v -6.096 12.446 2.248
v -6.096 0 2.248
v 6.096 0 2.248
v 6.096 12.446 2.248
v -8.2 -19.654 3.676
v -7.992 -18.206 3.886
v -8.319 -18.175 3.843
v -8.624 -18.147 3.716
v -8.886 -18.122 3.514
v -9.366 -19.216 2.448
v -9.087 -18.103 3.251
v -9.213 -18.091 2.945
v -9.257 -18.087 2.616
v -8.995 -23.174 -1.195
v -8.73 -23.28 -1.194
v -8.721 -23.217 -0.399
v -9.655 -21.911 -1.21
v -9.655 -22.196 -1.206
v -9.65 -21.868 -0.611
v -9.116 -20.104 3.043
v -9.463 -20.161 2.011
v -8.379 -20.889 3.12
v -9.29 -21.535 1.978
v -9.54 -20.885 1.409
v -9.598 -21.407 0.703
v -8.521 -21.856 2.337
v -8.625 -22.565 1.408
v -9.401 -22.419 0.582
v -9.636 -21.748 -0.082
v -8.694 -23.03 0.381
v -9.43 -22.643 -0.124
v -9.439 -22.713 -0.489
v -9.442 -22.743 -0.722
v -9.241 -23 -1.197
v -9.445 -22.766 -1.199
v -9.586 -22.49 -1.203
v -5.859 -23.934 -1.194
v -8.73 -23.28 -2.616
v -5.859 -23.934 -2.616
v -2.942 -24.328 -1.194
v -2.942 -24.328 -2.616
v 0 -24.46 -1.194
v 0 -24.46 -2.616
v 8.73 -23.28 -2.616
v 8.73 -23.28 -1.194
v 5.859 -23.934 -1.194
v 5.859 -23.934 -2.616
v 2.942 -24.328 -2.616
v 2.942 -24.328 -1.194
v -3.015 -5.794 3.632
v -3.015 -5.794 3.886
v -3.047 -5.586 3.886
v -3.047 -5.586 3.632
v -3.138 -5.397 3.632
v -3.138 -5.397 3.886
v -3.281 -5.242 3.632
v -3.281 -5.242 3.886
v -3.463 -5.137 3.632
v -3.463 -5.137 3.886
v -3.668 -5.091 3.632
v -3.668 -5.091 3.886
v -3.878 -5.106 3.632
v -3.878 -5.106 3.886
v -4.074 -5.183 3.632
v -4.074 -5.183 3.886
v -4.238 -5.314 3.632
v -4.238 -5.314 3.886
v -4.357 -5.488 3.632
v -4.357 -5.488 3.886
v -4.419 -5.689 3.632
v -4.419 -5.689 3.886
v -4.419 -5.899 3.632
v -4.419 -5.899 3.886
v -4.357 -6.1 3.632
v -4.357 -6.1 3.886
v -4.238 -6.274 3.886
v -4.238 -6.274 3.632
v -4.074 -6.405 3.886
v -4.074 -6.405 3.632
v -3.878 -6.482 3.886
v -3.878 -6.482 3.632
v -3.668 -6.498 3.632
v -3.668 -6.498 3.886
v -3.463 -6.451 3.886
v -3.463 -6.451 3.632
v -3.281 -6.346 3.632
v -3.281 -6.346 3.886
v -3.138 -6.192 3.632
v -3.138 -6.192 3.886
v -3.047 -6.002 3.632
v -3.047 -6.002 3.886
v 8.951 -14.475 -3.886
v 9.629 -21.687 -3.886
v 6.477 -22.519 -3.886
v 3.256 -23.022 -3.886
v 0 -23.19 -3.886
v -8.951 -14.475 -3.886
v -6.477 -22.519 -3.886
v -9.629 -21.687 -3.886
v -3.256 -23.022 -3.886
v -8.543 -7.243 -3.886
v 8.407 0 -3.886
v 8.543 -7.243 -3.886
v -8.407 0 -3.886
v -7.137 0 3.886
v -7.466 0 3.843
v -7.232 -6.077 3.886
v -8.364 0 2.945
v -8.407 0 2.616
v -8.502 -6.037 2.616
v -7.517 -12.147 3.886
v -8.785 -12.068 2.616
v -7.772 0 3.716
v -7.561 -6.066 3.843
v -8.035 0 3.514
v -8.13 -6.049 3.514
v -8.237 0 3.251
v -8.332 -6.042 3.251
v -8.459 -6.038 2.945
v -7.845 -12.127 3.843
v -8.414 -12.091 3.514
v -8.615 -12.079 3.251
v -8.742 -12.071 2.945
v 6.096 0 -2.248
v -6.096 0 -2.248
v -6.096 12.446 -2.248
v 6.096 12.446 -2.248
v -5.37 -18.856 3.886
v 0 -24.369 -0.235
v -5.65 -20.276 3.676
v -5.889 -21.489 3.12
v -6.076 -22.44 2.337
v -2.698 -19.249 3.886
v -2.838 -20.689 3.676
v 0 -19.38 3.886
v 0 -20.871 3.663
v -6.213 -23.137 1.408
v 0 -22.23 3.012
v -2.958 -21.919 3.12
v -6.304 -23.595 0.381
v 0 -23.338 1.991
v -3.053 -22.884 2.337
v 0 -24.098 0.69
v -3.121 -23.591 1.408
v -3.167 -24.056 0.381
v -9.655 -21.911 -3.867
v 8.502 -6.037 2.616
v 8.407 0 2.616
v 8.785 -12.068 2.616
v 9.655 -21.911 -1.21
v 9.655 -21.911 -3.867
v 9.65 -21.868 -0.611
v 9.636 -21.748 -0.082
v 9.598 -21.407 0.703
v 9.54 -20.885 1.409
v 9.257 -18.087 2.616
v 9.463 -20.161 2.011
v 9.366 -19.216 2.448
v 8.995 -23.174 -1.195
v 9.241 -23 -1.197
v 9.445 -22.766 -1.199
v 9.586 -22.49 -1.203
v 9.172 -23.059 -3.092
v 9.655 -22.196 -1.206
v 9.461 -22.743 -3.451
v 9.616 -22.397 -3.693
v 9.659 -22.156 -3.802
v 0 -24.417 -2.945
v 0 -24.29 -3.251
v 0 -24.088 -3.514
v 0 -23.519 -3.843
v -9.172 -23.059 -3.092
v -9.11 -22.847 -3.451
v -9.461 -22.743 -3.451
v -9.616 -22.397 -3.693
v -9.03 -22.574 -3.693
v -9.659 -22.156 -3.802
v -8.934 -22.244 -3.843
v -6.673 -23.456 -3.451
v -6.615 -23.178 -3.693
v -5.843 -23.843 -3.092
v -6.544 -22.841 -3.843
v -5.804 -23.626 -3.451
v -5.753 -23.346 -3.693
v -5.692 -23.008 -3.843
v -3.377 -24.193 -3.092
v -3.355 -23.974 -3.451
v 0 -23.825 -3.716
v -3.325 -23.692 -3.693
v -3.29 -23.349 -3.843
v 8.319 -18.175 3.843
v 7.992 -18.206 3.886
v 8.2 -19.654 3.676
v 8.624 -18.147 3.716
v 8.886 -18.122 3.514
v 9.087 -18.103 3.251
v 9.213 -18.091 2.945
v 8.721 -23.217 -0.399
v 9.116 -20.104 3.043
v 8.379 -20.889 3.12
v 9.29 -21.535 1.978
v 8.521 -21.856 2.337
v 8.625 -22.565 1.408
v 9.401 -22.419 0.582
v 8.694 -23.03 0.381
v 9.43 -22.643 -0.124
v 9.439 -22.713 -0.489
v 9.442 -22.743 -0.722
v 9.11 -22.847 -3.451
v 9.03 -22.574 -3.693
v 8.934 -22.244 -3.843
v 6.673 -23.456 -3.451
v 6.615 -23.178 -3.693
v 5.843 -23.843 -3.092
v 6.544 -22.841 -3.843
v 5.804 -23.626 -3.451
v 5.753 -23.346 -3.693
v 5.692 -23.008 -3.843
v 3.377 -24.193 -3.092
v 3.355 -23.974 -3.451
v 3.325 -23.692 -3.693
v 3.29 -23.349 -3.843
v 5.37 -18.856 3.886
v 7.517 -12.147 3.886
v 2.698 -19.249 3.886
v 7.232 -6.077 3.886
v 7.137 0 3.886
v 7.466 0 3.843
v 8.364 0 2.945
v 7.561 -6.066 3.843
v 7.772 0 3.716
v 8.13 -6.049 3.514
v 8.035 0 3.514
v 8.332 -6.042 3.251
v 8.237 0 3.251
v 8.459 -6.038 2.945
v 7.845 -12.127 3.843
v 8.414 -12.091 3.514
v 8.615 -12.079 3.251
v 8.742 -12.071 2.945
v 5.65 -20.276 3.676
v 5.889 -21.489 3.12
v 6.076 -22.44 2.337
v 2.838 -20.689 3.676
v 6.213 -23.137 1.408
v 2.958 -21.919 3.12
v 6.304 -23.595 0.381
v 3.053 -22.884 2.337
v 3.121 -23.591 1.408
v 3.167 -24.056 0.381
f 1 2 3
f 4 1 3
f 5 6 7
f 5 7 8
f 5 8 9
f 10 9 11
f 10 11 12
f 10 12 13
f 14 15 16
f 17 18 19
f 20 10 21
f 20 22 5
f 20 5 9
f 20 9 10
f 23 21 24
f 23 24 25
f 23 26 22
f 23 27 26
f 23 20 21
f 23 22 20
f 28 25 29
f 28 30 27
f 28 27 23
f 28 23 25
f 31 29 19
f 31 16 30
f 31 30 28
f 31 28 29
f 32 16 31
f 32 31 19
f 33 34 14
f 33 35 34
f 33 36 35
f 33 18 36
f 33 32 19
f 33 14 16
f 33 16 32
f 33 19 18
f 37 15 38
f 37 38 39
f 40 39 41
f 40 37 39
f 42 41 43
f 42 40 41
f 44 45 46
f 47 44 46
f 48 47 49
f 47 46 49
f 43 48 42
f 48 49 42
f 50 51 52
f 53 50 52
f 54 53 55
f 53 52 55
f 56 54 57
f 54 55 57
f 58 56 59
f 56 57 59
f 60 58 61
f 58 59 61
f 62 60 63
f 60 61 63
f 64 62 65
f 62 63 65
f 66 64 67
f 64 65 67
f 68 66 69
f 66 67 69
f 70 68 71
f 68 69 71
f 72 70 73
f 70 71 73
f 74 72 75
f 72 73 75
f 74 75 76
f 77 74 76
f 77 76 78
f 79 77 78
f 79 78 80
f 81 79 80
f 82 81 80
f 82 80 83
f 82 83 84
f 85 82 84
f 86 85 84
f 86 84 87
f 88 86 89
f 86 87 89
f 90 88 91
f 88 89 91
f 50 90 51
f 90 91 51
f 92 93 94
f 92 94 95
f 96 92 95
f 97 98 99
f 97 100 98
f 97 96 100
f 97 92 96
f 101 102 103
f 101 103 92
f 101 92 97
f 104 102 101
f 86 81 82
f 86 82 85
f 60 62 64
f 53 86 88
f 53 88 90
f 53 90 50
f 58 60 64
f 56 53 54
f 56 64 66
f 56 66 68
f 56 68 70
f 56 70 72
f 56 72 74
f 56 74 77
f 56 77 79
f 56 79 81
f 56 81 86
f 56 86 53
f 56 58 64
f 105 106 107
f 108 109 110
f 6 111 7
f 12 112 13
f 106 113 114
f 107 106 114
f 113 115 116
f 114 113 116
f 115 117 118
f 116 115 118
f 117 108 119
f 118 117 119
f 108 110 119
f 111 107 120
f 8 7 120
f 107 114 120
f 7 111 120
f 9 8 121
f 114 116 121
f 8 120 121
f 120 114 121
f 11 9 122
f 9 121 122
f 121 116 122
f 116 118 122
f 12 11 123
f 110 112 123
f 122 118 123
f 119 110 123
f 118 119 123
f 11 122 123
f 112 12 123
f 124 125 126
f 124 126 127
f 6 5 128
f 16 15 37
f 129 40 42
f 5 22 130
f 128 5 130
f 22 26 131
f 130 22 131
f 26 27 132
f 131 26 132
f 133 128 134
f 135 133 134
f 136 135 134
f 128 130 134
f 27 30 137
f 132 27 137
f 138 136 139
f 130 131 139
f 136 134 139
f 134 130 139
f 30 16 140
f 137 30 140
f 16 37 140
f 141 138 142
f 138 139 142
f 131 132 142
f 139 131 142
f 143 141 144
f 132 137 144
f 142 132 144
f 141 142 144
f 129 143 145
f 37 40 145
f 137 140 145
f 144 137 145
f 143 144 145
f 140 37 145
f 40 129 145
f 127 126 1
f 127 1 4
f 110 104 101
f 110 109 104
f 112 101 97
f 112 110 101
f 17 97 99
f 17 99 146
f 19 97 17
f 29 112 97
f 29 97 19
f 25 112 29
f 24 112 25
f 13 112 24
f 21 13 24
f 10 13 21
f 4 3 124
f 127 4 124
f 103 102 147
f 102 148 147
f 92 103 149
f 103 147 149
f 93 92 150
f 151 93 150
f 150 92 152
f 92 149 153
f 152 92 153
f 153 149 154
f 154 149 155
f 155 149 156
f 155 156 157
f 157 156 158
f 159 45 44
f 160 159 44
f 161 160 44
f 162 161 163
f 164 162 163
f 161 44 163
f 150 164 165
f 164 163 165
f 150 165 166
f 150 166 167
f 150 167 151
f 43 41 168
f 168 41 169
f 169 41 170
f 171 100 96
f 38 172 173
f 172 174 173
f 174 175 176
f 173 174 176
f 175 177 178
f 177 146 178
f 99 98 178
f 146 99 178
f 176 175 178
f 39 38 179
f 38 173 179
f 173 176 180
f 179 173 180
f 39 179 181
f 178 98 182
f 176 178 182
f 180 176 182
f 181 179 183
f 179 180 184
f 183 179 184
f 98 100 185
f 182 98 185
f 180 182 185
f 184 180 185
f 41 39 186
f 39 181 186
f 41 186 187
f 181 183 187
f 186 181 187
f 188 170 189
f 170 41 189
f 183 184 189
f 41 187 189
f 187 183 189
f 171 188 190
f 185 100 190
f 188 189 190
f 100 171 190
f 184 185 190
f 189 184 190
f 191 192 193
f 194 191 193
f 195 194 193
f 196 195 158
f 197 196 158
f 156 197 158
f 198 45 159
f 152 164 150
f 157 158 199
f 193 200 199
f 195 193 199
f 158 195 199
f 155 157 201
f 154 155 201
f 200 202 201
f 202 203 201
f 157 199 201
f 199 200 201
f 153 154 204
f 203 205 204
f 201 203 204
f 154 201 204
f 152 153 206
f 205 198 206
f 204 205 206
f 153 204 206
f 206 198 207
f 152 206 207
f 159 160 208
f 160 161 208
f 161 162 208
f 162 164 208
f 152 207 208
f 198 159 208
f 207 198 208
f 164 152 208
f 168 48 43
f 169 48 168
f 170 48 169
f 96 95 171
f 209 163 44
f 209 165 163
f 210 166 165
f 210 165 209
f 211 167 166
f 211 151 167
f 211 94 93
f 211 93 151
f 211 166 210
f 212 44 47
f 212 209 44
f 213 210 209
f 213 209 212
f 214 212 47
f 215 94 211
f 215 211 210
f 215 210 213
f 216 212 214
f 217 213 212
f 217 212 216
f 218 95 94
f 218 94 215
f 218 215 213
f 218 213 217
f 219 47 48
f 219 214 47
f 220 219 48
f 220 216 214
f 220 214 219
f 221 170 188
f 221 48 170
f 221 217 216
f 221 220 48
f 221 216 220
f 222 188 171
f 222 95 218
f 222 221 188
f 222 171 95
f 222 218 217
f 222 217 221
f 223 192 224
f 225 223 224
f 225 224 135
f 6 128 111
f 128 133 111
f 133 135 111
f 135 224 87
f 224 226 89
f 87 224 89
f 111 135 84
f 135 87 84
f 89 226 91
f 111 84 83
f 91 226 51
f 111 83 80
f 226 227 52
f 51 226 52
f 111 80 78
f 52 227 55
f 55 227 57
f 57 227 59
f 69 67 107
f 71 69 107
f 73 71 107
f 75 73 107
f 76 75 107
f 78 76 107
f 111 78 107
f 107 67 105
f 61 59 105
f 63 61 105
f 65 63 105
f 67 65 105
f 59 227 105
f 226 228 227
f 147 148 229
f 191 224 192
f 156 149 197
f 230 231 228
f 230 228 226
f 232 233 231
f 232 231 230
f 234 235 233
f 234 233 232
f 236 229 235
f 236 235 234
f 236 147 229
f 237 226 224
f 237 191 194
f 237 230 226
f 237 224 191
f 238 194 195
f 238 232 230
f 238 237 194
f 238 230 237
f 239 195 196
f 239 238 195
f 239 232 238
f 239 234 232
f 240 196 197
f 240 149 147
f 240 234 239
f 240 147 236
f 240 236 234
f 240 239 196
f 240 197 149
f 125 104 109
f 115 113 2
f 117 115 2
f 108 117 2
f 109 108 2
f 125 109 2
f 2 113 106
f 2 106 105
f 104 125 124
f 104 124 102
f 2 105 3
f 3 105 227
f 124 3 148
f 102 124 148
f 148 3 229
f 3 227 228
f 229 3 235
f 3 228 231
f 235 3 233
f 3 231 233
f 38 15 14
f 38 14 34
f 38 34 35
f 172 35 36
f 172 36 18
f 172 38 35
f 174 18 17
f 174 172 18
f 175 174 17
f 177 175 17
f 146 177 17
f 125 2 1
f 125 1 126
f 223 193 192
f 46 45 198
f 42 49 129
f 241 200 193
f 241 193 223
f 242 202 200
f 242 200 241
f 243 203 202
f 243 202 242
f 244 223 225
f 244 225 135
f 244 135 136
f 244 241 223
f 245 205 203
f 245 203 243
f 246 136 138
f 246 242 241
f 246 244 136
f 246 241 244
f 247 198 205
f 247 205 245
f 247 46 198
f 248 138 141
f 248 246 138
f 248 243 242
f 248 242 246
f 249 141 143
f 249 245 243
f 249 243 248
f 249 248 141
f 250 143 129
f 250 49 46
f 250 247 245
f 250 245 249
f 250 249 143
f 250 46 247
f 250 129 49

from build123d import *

# Parameters (mm, degrees)
SKETCH1_W           = 12.192
SKETCH1_H           = 4.4958
BOSS_EXTRUDE1_DEPTH = 12.446
BOSS_EXTRUDE2_DEPTH = 3.8862
FILLET1_R           = 5.08
FILLET2_R           = 1.27
SKETCH3_R           = 0.705537126
CUT_EXTRUDE1_DEPTH  = 0.254


# Read off the part's stored shape, not the designer's step: Mirror1
with BuildPart() as part:
    # Sketch1 → Boss-Extrude1 (new body)
    with BuildSketch(Plane(origin=(0, 0, 0), x_dir=(1, 0, 0), z_dir=(0, 1, 0))):
        Rectangle(SKETCH1_W, SKETCH1_H)
    extrude(amount=BOSS_EXTRUDE1_DEPTH)

    # Sketch2 → Boss-Extrude2 (add, symmetric)
    with BuildSketch(Plane.XY):
        with BuildLine():
            Line((0, 0), (-8.4074, 0))
            ThreePointArc((-8.4074, 0), (-8.750605066, -11.506432361), (-9.779, -22.971953685))
            ThreePointArc((-9.779, -22.971953685), (-4.945799179, -24.086008668), (0, -24.4602))
            Line((0, -24.4602), (0, 0))
        make_face()
    extrude(amount=BOSS_EXTRUDE2_DEPTH, both=True)

    # Fillet1
    fillet1_edges = [part.edges().sort_by_distance(p)[0] for p in [
        (-4.945799179, -24.086008668, 3.8862),
    ]]
    fillet(fillet1_edges, radius=FILLET1_R)

    # Fillet2
    fillet2_edges = [part.edges().sort_by_distance(p)[0] for p in [
        (-4.945799179, -24.086008668, -3.8862),
        (-8.61315874, -8.910874841, 3.8862),
        (-9.779, -22.971953685, -2.54),
        (-9.601797377, -21.441669836, 2.422651407),
    ]]
    fillet(fillet2_edges, radius=FILLET2_R)

    # Mirror1: part across plane


with BuildPart() as part_1:
    add(part.part)
    add(part.part.mirror(Plane(origin=(0, 0, 0), x_dir=(0, 0, 1), z_dir=(1, 0, 0))))

    # Sketch3 → Cut-Extrude1 (cut)
    with BuildSketch(Plane.XY.offset(3.8862)):
        with Locations((-3.72090503, -5.794071086)):
            Circle(SKETCH3_R)
    extrude(amount=-CUT_EXTRUDE1_DEPTH, mode=Mode.SUBTRACT)


solid = part_1.part
